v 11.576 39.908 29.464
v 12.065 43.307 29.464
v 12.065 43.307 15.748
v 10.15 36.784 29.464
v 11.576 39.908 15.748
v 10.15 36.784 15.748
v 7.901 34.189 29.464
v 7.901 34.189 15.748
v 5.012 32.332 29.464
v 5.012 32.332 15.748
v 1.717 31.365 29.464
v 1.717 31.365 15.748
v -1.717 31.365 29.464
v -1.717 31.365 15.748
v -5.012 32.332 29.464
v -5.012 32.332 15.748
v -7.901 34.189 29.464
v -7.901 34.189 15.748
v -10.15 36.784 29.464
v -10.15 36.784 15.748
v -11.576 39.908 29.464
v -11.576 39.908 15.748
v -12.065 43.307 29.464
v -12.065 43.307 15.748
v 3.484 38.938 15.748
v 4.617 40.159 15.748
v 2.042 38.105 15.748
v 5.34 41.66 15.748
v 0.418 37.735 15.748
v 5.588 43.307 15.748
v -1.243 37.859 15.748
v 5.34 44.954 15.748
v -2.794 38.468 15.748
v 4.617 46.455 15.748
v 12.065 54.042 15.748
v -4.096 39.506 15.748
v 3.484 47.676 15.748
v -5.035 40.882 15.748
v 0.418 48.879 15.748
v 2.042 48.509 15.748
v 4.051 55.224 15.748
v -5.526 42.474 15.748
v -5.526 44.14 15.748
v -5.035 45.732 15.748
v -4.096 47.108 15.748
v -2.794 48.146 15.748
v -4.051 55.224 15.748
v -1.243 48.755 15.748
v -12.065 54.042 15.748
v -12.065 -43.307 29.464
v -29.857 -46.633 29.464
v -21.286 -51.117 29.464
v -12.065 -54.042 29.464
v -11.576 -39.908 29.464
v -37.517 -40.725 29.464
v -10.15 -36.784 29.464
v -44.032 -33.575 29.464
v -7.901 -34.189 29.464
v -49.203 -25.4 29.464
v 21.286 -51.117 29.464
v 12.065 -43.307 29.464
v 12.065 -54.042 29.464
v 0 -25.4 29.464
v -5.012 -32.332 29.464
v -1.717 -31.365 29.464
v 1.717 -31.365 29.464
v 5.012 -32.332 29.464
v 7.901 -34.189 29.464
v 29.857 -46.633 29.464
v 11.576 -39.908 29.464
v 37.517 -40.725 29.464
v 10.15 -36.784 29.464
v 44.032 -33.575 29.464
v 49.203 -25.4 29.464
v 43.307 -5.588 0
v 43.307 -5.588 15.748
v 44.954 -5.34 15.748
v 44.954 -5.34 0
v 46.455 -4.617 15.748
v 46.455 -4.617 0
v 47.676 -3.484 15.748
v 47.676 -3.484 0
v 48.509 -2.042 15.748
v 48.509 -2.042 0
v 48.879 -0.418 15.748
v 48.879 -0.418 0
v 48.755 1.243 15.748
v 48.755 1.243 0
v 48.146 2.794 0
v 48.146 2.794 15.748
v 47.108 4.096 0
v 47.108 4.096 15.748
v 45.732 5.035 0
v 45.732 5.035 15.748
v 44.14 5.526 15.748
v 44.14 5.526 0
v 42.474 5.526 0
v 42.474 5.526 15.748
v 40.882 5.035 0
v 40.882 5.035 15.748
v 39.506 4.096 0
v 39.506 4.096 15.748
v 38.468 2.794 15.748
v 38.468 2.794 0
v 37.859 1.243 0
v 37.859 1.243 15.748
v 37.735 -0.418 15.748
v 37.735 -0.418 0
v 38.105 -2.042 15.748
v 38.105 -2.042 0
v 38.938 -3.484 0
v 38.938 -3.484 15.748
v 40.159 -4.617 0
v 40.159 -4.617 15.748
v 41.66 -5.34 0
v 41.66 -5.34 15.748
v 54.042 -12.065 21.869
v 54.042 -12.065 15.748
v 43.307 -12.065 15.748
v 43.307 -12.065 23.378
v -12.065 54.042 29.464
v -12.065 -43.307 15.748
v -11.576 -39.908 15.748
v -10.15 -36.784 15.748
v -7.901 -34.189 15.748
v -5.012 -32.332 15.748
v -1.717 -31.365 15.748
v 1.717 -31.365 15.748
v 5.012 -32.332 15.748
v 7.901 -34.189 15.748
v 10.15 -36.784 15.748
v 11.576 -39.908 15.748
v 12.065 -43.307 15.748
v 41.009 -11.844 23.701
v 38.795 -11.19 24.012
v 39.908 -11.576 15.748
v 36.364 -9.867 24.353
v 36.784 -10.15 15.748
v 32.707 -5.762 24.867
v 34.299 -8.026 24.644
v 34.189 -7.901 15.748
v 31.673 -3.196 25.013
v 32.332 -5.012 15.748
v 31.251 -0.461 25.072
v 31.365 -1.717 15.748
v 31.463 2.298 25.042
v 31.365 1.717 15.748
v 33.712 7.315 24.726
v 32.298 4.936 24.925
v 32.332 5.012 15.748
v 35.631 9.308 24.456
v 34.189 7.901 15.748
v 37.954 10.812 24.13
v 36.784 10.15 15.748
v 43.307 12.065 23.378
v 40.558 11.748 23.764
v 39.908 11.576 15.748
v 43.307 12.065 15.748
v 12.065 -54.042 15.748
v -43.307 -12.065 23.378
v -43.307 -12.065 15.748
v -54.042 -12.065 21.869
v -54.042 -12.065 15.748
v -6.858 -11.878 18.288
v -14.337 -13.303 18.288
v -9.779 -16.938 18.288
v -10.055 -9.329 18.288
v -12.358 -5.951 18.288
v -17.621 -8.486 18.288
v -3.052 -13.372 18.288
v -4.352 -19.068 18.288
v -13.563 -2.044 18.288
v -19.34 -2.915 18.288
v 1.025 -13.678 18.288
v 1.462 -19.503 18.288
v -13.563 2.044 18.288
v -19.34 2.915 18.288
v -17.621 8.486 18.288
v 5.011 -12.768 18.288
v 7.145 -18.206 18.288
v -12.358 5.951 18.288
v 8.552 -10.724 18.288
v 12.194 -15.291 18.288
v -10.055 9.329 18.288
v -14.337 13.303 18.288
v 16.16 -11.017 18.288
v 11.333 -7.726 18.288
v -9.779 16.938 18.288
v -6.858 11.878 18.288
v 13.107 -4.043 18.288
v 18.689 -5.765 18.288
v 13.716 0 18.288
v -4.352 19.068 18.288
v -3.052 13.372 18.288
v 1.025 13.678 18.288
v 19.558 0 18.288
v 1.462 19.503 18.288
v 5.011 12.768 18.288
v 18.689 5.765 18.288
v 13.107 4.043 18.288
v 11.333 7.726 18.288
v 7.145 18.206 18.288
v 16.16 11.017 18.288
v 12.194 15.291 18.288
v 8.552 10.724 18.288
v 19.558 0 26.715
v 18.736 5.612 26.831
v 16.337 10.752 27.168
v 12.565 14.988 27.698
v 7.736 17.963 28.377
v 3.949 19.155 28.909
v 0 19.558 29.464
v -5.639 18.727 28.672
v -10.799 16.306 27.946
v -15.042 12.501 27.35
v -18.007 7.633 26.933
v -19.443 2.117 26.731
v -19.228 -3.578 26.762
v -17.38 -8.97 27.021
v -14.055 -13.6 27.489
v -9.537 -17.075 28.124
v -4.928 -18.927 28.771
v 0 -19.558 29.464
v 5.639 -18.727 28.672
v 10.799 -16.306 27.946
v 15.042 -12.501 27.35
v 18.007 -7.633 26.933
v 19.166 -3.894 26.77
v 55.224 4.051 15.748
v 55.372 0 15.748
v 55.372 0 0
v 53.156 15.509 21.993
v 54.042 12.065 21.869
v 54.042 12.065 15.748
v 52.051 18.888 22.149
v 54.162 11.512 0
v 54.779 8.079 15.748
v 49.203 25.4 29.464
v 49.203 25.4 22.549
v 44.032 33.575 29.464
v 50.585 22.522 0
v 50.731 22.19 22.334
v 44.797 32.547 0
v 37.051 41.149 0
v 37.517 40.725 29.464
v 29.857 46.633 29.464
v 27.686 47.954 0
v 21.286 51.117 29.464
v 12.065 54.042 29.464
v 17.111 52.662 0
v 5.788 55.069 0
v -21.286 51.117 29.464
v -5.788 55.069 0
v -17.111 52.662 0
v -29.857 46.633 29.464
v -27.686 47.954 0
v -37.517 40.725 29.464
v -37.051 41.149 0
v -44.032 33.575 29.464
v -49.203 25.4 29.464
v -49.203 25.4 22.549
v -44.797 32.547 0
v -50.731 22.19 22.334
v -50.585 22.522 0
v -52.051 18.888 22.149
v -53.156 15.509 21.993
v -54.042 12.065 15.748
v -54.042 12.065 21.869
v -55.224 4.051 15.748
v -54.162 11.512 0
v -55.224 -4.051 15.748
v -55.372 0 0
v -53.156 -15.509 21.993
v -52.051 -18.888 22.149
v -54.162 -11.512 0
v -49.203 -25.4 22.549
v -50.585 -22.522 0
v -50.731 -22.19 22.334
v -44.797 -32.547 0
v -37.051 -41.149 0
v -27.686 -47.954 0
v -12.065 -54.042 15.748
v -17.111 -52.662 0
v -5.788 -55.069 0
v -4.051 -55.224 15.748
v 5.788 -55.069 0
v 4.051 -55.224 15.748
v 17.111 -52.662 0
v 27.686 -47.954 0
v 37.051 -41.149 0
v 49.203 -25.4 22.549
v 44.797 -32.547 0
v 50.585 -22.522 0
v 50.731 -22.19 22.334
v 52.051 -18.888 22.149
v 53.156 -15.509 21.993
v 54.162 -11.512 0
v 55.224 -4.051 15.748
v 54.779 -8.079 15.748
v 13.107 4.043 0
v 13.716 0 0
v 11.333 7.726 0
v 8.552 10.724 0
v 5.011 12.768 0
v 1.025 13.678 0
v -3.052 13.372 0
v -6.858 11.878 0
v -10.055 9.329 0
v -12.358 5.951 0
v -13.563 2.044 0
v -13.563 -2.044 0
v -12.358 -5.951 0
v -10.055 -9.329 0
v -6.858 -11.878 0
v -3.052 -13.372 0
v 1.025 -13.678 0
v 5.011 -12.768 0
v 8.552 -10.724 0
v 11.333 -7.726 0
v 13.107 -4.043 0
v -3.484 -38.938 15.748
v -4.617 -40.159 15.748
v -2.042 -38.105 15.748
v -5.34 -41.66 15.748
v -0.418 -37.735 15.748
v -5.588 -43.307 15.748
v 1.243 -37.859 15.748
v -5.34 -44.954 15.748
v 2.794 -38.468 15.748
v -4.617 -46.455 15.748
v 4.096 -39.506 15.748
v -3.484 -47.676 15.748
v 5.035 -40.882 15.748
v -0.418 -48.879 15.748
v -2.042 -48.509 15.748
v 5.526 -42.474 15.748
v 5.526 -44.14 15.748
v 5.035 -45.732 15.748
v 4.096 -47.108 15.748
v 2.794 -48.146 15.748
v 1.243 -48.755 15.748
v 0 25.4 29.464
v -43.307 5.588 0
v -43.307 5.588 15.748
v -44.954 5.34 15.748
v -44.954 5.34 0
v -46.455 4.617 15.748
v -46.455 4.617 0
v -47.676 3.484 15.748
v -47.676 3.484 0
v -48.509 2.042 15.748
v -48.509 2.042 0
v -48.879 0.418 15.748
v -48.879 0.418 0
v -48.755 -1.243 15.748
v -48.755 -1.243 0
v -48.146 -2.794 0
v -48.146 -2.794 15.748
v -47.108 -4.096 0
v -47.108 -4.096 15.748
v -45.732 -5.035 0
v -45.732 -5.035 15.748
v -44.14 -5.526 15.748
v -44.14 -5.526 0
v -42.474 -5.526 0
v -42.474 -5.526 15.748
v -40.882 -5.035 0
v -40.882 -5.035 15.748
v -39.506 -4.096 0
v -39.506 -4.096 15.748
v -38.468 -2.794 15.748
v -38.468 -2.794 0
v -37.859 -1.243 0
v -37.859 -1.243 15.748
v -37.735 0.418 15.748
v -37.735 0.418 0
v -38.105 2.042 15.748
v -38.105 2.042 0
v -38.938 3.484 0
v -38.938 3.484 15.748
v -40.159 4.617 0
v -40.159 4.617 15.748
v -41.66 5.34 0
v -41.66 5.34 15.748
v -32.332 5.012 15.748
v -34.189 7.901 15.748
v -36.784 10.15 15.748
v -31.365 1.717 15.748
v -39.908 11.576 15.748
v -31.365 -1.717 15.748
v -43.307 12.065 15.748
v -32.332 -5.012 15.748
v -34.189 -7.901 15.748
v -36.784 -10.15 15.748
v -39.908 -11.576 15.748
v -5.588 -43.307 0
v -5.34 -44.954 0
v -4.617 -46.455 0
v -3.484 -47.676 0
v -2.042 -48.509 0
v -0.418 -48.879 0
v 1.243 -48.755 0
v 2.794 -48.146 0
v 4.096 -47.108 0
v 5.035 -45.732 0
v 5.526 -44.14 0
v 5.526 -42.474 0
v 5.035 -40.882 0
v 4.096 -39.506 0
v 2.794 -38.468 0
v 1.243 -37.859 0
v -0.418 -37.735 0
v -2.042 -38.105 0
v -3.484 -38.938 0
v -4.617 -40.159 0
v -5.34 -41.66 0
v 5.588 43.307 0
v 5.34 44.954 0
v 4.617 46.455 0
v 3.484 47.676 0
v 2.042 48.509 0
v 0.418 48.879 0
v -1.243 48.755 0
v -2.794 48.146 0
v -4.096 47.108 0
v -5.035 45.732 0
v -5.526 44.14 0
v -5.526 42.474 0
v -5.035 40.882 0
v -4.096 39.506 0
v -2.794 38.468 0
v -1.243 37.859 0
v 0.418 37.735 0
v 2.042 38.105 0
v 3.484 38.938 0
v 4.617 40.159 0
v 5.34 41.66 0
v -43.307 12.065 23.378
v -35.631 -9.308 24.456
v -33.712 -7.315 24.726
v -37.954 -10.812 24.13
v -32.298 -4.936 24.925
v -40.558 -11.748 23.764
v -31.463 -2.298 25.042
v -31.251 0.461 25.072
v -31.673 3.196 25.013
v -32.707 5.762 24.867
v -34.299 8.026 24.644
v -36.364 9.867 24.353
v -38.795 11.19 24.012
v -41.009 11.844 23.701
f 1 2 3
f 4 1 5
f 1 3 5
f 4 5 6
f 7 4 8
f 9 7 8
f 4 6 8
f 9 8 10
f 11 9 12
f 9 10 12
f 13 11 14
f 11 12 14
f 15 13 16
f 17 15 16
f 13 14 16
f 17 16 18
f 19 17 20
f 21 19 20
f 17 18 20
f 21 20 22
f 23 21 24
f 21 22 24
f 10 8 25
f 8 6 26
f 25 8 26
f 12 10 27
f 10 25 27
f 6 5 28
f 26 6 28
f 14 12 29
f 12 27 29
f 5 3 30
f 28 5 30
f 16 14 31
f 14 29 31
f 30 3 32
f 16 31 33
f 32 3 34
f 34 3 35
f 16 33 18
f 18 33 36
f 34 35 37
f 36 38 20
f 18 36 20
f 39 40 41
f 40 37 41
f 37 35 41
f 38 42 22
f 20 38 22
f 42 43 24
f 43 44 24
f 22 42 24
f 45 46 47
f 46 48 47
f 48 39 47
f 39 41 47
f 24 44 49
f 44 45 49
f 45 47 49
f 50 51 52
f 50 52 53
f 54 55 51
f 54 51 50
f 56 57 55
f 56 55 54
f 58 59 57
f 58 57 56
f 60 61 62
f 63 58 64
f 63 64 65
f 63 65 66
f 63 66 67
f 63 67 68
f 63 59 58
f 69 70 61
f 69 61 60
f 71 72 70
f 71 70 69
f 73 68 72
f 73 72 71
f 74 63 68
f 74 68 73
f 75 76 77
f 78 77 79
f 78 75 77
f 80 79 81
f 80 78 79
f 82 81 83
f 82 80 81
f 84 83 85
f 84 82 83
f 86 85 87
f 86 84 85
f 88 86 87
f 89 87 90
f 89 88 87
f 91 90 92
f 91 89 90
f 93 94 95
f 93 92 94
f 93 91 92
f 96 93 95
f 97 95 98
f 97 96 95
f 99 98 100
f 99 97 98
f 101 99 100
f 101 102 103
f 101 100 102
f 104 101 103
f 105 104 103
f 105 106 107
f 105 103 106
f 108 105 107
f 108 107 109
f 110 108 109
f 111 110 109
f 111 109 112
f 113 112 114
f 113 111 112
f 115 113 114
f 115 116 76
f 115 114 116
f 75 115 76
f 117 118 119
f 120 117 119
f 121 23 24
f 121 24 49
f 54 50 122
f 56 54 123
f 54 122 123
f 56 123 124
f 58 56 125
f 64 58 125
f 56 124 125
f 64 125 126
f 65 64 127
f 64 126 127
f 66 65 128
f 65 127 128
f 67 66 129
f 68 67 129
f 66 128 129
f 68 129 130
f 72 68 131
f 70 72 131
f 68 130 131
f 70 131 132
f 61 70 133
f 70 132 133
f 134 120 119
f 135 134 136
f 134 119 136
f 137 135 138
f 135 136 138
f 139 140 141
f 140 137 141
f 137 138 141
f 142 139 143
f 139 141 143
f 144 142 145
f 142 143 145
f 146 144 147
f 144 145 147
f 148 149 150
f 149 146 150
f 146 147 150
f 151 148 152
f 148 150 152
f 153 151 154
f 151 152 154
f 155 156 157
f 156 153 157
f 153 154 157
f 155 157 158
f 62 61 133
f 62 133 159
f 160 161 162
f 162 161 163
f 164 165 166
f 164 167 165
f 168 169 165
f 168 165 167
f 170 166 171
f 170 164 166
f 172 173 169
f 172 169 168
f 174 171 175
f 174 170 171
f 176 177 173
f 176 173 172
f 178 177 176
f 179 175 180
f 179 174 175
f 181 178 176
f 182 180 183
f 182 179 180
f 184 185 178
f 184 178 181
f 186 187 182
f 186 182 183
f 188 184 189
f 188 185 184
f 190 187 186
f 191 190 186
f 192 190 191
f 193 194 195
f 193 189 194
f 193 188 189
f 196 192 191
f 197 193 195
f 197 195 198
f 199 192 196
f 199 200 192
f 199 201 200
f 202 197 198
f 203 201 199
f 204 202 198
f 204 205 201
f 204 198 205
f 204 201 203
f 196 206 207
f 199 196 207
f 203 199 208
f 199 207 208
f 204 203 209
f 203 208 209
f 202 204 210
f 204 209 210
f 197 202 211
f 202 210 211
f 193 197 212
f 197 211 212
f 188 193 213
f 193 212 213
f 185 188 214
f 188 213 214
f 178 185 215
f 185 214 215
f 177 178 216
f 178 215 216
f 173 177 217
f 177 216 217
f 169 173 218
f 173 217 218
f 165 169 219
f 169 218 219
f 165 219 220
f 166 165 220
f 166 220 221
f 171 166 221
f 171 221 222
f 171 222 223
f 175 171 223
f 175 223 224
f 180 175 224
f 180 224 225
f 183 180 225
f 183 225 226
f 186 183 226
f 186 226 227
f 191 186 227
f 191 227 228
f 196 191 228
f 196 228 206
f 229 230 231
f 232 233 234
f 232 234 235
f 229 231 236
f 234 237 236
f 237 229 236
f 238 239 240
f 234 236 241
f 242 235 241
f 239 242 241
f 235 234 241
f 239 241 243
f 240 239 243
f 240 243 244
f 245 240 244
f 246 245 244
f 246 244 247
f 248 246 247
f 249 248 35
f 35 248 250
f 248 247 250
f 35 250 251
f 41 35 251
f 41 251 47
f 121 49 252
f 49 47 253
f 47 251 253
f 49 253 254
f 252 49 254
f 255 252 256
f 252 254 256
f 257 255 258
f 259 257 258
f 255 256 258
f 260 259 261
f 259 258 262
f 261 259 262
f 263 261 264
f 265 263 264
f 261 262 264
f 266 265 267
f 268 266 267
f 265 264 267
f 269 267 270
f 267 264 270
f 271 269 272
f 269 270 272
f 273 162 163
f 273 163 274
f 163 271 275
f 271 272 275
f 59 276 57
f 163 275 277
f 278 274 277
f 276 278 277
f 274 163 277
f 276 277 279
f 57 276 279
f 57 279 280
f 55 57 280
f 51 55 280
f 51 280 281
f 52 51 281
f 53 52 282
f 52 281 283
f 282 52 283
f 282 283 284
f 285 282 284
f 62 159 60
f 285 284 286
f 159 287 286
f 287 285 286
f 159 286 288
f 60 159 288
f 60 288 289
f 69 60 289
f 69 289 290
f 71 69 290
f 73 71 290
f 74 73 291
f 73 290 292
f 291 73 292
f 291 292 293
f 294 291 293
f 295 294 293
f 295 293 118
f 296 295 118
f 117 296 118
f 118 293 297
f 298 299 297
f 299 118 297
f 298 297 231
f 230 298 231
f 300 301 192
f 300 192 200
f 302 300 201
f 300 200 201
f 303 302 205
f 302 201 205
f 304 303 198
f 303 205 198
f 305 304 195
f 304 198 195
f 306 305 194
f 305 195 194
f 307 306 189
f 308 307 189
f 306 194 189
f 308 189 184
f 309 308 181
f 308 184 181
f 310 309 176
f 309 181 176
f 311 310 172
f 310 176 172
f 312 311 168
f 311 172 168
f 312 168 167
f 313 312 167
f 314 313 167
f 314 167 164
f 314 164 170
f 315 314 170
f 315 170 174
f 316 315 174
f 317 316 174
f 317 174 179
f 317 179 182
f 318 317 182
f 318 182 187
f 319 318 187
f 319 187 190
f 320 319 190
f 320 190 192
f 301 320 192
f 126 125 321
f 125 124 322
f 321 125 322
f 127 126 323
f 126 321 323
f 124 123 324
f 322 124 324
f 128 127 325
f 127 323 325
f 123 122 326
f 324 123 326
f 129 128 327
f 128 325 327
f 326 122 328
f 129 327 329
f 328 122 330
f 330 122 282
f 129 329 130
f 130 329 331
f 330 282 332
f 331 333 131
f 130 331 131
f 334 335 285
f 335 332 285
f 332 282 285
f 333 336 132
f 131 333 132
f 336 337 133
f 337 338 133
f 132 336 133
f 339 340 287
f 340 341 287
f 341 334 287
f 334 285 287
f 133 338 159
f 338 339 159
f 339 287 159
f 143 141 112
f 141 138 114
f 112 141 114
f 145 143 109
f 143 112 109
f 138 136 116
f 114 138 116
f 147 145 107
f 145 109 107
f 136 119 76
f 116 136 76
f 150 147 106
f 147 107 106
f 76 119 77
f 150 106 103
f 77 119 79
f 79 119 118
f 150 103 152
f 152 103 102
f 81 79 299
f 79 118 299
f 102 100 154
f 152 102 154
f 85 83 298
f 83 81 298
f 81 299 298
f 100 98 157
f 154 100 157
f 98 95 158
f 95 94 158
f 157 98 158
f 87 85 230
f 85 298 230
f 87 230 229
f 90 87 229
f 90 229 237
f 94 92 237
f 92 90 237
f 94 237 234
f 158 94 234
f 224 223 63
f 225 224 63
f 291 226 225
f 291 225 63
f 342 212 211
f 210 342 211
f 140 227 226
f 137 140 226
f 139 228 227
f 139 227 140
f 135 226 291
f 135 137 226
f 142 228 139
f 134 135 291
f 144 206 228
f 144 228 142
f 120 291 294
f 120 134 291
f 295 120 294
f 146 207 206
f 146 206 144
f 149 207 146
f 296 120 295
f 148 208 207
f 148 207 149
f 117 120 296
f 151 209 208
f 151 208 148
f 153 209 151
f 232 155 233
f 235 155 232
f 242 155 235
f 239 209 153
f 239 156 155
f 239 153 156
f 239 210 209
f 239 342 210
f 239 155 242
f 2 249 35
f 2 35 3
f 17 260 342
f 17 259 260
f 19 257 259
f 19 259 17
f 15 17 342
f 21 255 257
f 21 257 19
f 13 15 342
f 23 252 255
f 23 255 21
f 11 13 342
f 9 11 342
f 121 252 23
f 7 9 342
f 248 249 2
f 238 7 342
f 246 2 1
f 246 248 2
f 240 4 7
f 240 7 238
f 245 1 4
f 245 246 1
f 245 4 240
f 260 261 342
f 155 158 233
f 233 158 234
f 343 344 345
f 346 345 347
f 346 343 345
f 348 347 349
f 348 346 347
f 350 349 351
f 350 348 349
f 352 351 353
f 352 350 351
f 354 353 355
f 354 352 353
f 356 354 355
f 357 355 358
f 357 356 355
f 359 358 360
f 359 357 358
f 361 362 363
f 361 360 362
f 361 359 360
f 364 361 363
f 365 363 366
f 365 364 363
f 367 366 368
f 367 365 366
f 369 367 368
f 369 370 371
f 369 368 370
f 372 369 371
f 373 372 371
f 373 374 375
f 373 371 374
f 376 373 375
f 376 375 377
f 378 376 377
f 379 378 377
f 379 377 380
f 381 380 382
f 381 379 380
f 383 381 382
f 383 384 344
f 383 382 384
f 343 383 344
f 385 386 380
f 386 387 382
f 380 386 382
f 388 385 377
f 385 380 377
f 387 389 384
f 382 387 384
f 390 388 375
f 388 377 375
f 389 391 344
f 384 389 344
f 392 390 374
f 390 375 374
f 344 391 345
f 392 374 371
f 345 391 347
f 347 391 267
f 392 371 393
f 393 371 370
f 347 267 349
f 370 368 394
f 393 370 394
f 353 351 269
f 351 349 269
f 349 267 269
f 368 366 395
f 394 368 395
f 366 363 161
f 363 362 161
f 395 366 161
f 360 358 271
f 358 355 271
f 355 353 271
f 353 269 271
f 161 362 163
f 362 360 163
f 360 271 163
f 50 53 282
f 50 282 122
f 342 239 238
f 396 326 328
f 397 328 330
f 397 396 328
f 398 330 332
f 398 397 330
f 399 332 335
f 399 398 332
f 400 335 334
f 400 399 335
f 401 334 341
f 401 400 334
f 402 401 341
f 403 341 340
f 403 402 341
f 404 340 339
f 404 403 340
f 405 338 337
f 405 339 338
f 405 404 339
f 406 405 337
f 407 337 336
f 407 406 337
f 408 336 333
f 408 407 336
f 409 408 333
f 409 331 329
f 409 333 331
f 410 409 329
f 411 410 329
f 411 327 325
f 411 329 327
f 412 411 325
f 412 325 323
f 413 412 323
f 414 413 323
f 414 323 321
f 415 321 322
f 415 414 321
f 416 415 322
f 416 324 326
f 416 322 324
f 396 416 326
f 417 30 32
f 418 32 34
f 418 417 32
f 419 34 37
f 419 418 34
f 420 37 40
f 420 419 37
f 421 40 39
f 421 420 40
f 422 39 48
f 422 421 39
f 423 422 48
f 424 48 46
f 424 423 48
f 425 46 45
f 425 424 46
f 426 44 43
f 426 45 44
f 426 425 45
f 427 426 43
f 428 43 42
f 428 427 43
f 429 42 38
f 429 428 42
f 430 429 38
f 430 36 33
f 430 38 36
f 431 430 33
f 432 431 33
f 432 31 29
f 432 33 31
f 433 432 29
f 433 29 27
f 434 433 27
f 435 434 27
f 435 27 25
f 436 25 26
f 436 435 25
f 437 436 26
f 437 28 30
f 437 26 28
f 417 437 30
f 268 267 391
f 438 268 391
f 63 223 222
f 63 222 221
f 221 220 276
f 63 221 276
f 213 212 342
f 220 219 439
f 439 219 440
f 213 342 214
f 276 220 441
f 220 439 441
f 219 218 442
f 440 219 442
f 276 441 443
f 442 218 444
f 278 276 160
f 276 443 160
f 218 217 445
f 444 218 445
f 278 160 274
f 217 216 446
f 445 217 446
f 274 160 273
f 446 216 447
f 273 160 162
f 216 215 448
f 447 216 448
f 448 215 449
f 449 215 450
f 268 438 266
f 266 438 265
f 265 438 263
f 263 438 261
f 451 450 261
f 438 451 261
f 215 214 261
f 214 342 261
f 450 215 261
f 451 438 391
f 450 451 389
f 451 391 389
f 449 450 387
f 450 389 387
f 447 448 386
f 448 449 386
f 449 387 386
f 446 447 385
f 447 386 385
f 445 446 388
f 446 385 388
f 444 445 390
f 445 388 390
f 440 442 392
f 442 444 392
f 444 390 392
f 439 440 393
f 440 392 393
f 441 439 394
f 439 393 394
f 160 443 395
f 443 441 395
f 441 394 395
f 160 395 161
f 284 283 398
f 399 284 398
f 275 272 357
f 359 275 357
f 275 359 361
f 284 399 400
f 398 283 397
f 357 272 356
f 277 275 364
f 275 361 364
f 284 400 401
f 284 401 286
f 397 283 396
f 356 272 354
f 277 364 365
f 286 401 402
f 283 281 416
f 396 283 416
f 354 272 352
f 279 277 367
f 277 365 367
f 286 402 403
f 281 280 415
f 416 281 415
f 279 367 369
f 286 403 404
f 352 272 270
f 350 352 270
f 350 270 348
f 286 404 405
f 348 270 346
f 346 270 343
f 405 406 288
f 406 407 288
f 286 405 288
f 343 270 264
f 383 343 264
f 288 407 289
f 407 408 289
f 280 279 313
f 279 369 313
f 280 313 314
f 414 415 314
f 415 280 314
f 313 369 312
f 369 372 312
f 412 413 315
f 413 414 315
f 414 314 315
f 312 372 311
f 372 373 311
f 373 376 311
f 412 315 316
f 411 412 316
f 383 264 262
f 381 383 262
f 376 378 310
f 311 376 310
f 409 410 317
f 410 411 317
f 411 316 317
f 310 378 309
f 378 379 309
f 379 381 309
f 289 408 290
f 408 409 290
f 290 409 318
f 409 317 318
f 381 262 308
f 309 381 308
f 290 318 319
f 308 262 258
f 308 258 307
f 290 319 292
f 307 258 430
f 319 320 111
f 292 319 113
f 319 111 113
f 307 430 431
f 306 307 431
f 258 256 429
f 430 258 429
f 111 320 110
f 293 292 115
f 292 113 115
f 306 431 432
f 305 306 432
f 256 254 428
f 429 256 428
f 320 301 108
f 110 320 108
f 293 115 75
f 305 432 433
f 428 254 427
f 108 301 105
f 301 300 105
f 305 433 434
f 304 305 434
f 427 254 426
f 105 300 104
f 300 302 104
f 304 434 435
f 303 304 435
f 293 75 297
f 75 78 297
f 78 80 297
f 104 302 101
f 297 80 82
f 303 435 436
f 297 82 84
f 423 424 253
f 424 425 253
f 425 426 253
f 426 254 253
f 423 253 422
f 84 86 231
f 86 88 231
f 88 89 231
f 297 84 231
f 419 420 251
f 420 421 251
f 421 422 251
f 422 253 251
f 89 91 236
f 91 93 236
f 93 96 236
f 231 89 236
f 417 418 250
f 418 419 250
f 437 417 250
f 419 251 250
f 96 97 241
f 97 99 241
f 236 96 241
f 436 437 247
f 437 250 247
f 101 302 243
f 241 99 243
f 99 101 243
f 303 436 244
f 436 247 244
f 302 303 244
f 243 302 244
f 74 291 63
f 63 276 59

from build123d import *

# Parameters (mm, degrees)
SKETCH1_R          = 55.372
EXTRUDE1_DEPTH     = 29.464
SKETCH4_R          = 13.716
CUT_EXTRUDE1_DEPTH = 29.464
SKETCH5_R          = 19.558
CUT_EXTRUDE2_DEPTH = 11.176
SKETCH6_W          = 66.904134355
SKETCH6_H          = 50.8
CUT_REVOLVE1_ANGLE = 8
CUT_EXTRUDE4_START = 15.748
CUT_EXTRUDE4_DEPTH = 14.716
SKETCH12_R         = 5.588
CUT_EXTRUDE5_DEPTH = 30.464
CIRPATTERN1_COUNT  = 4


with BuildPart() as part:
    # Sketch1 → Extrude1 (new body)
    with BuildSketch(Plane.XY):
        Circle(SKETCH1_R)
    extrude(amount=EXTRUDE1_DEPTH)

    # Sketch4 → Cut-Extrude1 (cut)
    with BuildSketch(Plane.XY.offset(29.464)):
        Circle(SKETCH4_R)
    extrude(amount=-CUT_EXTRUDE1_DEPTH, mode=Mode.SUBTRACT)

    # Sketch5 → Cut-Extrude2 (cut)
    with BuildSketch(Plane.XY.offset(29.464)):
        Circle(SKETCH5_R)
    extrude(amount=-CUT_EXTRUDE2_DEPTH, mode=Mode.SUBTRACT)

    # Sketch6 → Cut-Revolve1 (revolve, cut)
    with BuildSketch(Plane.XY.offset(29.464)):
        with Locations((33.452067178, 0)):
            Rectangle(SKETCH6_W, SKETCH6_H)
    cut_revolve1 = revolve(axis=Axis((0, 25.4, 29.464), (0, 1, 0)), revolution_arc=CUT_REVOLVE1_ANGLE, mode=Mode.SUBTRACT)

    # Mirror1: Cut-Revolve1 across plane
    add(cut_revolve1.mirror(Plane(origin=(0, 0, 0), x_dir=(0, 0, 1), z_dir=(1, 0, 0))), mode=Mode.SUBTRACT)

    # Sketch9 → Cut-Extrude4 (cut, through all)
    with BuildSketch(Plane.XY.offset(CUT_EXTRUDE4_START)):
        with BuildLine():
            Line((-12.065, 43.307), (-12.065, 67.279112083))
            Line((-12.065, 67.279112083), (12.065, 66.235281078))
            Line((12.065, 66.235281078), (12.065, 43.307))
            ThreePointArc((12.065, 43.307), (0, 31.242), (-12.065, 43.307))
        make_face()
    cut_extrude4 = extrude(amount=CUT_EXTRUDE4_DEPTH, mode=Mode.SUBTRACT)

    # Sketch12 → Cut-Extrude5 (cut, through all)
    with BuildSketch(Plane.XY):
        with Locations((0, 43.307)):
            Circle(SKETCH12_R)
    cut_extrude5 = extrude(amount=CUT_EXTRUDE5_DEPTH, mode=Mode.SUBTRACT)

    # CirPattern1: Cut-Extrude4, Cut-Extrude5 ×4 about axis
    cirpattern1_axis = Axis((0, 0, 0), (0, 0, 1))
    for i in range(1, CIRPATTERN1_COUNT):
        add(cut_extrude4.rotate(cirpattern1_axis, i * 360 / CIRPATTERN1_COUNT), mode=Mode.SUBTRACT)
        add(cut_extrude5.rotate(cirpattern1_axis, i * 360 / CIRPATTERN1_COUNT), mode=Mode.SUBTRACT)


solid = part.part
